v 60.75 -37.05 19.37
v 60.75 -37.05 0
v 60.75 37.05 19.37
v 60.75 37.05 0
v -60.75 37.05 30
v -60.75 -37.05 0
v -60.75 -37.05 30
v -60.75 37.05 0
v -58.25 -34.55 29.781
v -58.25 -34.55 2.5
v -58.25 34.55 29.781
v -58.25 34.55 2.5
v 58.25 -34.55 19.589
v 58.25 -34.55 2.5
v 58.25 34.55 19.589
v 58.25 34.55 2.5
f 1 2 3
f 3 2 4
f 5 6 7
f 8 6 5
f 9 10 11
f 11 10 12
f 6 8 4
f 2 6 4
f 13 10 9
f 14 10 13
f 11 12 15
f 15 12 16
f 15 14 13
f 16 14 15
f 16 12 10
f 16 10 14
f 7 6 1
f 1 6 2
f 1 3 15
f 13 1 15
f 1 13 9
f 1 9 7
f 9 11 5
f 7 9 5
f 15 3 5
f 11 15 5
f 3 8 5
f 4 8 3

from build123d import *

# Parameters (mm, degrees)
F0_W     = 121.5
F0_H     = 74.1
F1_DEPTH = 30
F2_T     = -2.5
F5_DEPTH = 79.2


with BuildPart() as f1:
    # F0 (on Top) → F1 (new body)
    with BuildSketch(Plane.XY):
        Rectangle(F0_W, F0_H)
    extrude(amount=F1_DEPTH)

    # F2
    f2_openings = [f1.faces().sort_by_distance(p)[0] for p in [
        (0, 0, 30),
    ]]
    offset(amount=F2_T, openings=f2_openings)

    # F3 (on face) → F5 (cut)
    with BuildSketch(Plane(origin=(0, 37.05, 0), x_dir=(-1, 0, 0), z_dir=(0, 1, 0))):
        Polygon((-60.75, 19.370127), (60.75, 30), (-60.75, 30), align=None)
    extrude(amount=-F5_DEPTH, mode=Mode.SUBTRACT)


solid = f1.part
